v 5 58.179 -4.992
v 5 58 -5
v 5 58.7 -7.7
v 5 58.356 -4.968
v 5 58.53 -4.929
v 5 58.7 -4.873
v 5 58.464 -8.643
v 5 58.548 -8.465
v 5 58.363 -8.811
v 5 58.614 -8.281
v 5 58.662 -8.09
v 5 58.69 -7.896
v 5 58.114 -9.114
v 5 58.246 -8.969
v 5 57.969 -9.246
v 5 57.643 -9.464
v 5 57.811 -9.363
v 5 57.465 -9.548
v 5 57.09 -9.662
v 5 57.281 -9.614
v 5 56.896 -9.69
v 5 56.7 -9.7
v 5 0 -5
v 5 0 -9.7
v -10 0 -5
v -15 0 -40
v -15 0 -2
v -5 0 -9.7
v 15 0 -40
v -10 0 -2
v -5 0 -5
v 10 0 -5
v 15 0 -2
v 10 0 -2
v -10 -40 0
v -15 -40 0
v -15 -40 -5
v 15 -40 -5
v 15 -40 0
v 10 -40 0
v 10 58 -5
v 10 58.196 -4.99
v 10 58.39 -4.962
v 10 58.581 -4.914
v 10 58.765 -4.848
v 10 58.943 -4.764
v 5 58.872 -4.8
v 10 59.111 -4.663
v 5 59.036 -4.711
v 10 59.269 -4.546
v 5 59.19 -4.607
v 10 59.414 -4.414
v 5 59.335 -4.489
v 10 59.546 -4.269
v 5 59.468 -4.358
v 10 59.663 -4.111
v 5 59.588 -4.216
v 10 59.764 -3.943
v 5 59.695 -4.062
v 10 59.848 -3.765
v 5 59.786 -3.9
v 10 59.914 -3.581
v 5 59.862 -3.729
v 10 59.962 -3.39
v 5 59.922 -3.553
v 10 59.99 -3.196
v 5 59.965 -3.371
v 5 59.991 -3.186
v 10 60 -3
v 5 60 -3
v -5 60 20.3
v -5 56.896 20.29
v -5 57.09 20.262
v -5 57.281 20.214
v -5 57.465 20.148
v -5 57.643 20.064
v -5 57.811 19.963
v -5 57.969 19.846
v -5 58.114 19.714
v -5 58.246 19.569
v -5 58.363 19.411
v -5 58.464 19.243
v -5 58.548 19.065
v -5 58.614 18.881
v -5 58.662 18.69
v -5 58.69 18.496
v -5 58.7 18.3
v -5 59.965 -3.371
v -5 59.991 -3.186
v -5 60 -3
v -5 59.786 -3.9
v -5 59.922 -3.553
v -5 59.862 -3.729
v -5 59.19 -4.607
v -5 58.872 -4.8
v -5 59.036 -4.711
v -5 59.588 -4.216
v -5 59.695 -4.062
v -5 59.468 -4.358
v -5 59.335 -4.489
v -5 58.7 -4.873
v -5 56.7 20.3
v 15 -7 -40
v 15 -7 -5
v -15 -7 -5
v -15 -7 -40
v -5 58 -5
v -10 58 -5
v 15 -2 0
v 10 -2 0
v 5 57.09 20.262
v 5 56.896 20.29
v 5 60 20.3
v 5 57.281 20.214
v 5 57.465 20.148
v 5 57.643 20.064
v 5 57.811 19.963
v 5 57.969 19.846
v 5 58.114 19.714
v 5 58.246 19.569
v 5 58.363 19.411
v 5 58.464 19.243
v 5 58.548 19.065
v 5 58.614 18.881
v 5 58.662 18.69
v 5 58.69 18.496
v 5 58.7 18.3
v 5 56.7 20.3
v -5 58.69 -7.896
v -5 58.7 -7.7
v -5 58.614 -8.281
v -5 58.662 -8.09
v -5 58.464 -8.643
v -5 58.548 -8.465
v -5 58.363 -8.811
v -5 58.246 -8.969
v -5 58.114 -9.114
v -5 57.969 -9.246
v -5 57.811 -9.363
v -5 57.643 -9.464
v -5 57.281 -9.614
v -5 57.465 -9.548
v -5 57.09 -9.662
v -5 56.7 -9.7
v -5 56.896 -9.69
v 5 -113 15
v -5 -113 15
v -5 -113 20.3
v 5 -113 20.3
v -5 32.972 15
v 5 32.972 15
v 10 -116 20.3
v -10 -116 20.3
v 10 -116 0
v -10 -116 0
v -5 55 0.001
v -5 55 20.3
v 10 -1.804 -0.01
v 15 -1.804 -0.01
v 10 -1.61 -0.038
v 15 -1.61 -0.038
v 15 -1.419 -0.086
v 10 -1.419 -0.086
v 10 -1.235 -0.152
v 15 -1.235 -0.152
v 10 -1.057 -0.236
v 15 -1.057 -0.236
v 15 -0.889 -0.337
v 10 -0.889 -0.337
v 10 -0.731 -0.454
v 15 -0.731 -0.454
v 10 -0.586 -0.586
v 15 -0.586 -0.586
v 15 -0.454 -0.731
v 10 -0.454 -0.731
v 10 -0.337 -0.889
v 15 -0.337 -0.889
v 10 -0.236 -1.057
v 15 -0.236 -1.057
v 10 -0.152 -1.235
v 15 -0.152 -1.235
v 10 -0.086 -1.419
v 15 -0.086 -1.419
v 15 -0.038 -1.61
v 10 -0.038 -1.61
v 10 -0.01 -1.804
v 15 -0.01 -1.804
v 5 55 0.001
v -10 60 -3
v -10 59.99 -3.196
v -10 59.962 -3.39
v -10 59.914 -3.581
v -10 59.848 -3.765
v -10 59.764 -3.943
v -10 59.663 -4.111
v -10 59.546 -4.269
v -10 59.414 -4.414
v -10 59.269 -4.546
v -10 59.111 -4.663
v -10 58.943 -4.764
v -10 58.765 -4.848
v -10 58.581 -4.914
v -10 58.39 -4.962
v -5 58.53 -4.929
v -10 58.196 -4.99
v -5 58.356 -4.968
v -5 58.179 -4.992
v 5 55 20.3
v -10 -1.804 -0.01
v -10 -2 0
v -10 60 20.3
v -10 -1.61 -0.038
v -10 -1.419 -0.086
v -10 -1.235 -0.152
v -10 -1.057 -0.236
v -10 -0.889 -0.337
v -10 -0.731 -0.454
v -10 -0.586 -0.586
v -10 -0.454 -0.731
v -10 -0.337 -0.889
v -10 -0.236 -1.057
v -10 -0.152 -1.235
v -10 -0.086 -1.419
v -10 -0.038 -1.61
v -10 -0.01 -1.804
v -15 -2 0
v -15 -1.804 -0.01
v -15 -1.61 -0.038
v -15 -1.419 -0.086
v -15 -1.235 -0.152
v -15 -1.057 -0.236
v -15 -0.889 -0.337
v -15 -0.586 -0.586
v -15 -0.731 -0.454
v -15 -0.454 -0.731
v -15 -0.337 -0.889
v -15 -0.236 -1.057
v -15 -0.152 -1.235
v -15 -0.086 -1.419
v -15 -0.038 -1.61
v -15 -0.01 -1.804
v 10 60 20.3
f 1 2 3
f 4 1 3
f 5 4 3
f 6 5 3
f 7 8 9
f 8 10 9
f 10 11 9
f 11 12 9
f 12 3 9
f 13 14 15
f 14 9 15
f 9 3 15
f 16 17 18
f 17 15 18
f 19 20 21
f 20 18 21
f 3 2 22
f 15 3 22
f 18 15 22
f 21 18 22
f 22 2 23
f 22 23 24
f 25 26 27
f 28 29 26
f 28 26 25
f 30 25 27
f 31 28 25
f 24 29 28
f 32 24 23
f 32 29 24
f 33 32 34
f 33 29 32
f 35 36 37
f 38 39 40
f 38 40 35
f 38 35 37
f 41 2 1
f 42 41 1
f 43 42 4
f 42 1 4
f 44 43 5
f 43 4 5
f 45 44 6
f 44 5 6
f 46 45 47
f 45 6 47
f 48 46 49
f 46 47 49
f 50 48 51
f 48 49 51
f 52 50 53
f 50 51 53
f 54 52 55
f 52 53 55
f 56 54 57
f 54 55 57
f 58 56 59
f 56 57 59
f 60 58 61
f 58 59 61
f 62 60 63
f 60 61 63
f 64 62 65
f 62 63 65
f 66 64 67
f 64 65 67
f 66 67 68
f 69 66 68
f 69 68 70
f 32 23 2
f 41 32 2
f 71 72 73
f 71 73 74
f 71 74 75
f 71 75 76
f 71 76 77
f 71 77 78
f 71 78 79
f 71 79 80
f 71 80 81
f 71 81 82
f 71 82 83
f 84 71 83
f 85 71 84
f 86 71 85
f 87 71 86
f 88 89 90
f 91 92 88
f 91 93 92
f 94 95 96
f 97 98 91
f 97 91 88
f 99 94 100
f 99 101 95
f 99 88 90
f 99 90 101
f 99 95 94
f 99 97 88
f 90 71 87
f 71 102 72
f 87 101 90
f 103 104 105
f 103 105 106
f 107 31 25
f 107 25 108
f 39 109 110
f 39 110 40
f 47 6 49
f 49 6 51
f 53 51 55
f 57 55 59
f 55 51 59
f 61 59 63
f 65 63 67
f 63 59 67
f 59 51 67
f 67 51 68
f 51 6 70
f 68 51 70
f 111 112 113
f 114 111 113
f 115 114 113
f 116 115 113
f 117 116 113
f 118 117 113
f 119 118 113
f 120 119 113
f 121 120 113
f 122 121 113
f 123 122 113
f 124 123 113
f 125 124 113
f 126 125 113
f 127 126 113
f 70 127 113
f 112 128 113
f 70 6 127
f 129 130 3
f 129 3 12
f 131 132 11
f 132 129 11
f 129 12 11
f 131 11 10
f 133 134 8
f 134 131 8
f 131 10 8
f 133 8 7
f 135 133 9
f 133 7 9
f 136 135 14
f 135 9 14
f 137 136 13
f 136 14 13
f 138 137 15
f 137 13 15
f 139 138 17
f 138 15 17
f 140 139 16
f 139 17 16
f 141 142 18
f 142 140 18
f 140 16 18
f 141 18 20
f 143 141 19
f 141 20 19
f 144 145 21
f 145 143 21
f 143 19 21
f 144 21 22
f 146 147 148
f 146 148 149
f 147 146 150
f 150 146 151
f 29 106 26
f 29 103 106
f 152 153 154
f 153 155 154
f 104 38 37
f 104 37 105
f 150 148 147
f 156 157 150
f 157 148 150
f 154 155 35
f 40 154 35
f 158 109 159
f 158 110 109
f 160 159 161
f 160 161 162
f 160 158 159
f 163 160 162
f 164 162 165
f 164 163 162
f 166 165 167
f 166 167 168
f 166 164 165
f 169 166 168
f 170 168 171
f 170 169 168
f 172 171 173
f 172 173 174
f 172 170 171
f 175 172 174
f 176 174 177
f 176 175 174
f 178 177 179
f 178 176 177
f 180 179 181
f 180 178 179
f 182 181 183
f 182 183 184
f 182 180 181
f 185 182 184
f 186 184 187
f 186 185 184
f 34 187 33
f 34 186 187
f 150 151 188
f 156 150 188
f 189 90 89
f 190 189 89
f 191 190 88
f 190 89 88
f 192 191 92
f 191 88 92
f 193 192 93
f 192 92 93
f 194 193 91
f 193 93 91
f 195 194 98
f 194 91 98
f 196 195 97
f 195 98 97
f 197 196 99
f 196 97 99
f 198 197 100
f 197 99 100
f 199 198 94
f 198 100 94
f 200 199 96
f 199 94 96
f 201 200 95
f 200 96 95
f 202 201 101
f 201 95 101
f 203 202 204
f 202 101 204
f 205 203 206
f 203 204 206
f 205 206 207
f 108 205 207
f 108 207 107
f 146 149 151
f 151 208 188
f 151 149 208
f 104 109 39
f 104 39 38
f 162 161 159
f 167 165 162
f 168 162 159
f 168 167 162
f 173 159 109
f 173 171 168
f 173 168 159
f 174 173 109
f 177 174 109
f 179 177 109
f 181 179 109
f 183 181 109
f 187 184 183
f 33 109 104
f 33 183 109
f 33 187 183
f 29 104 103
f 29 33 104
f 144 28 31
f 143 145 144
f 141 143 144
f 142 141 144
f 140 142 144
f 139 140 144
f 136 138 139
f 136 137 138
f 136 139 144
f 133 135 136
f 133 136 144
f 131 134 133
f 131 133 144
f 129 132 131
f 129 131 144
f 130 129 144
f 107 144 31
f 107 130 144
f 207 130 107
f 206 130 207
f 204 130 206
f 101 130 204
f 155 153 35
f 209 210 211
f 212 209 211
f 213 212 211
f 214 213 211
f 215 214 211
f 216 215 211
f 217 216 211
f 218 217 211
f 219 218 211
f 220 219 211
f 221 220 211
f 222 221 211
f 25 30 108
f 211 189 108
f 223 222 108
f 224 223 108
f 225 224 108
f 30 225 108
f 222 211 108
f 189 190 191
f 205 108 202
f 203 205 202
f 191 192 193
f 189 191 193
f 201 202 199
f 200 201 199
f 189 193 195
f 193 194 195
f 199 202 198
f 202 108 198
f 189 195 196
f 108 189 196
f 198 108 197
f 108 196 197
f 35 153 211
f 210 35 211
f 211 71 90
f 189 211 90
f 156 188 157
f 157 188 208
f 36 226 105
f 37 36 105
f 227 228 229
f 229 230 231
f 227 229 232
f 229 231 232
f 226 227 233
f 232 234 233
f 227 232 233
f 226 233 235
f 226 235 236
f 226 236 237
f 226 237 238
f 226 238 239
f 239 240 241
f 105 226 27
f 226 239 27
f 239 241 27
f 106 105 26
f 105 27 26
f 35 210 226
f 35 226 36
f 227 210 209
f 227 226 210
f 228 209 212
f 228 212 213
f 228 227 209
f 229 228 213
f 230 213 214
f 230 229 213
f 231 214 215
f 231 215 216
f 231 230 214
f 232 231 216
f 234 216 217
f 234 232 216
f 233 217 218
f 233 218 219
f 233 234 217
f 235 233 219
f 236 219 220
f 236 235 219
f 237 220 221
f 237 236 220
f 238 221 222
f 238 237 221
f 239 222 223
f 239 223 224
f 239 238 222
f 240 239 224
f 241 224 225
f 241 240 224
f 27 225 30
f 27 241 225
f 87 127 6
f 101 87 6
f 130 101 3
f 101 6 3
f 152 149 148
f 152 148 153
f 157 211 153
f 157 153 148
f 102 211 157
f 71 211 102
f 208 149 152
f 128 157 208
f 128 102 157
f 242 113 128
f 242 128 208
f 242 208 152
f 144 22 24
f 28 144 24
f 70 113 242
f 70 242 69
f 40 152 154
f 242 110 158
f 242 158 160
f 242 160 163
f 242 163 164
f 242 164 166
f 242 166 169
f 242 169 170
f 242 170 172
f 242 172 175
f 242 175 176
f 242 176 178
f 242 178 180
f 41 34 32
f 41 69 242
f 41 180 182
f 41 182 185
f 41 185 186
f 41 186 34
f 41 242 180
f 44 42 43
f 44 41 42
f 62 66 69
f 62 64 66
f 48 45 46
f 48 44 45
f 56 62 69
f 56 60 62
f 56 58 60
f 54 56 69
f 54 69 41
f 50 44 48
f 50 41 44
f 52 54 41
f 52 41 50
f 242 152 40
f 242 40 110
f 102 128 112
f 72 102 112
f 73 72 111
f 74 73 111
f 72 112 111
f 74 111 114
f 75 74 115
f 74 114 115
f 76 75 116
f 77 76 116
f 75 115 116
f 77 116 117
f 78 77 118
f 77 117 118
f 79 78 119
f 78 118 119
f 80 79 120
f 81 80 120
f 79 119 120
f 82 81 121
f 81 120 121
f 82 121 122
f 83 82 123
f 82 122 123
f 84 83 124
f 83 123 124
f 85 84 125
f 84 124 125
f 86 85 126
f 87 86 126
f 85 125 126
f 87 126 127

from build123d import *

# Parameters (mm, degrees)
BOSS_EXTRUDE2_DEPTH = 15
BOSS_EXTRUDE3_DEPTH = 5
BOSS_EXTRUDE4_DEPTH = 5
BOSS_EXTRUDE5_DEPTH = 10
SKETCH10_W          = 10
SKETCH10_H          = 3
BOSS_EXTRUDE6_DEPTH = 5.3
FILLET1_R           = 2
FILLET2_R           = 2


with BuildPart() as part:
    # Sketch2 → Boss-Extrude2 (new, symmetric)
    with BuildSketch(Plane(origin=(0, 0, 0), x_dir=(0, 0, -1), z_dir=(1, 0, 0))):
        Polygon((0, 0), (0, -40), (5, -40), (5, -7), (40, -7), (40, 0), align=None)
    extrude(amount=BOSS_EXTRUDE2_DEPTH, both=True)

    # Sketch3 → Boss-Extrude3 (add, symmetric)
    with BuildSketch(Plane(origin=(0, 0, 0), x_dir=(0, 0, -1), z_dir=(1, 0, 0))):
        Polygon((0, -116), (-15, -116), (-15, 32.97157442), (0, 55.00157442), align=None)
    extrude(amount=BOSS_EXTRUDE3_DEPTH, both=True)

    # Sketch4 → Boss-Extrude4 (add)
    with BuildSketch(Plane.ZY.offset(5)):
        Polygon((0, 60), (20.3, 60), (20.3, -116), (0, -116), (0, 0), (-5, 0), (-5, 60), align=None)
    boss_extrude4 = extrude(amount=BOSS_EXTRUDE4_DEPTH)

    # Mirror1: Boss-Extrude4 across plane
    add(boss_extrude4.mirror(Plane(origin=(0, 0, 0), x_dir=(0, 0, 1), z_dir=(1, 0, 0))))

    # Sketch8 → Boss-Extrude5 (add)
    with BuildSketch(Plane.ZY.offset(-5)):
        Polygon((0, 0), (0, 55), (20.3, 55), (20.3, 58.7), (-9.7, 58.7), (-9.7, 0), align=None)
    extrude(amount=BOSS_EXTRUDE5_DEPTH)

    # Sketch10 → Boss-Extrude6 (add)
    with BuildSketch(Plane.XY.offset(15)):
        with Locations((0, -114.5)):
            Rectangle(SKETCH10_W, SKETCH10_H)
    extrude(amount=BOSS_EXTRUDE6_DEPTH)

    # Fillet1
    # the kernel refuses this fillet: 2 mm, written as the material it takes off along each edge
    with BuildSketch(Plane(origin=(5, 58.7, 20.3), x_dir=(0, -1, 0), z_dir=(-1, 0, 0))) as fillet1_piece_1:
        with BuildLine():
            CenterArc((FILLET1_R, -FILLET1_R), FILLET1_R, 90, 90)
            Line((0, -FILLET1_R), (0, 0))
            Line((0, 0), (FILLET1_R, 0))
        make_face()
    extrude(amount=10, mode=Mode.SUBTRACT)
    with BuildSketch(Plane(origin=(10, 58.7, -9.7), x_dir=(0, 0, 1), z_dir=(-1, 0, 0))) as fillet1_piece_2:
        with BuildLine():
            CenterArc((FILLET1_R, -FILLET1_R), FILLET1_R, 90, 90)
            Line((0, -FILLET1_R), (0, 0))
            Line((0, 0), (FILLET1_R, 0))
        make_face()
    extrude(amount=20, mode=Mode.SUBTRACT)
    with BuildSketch(Plane(origin=(-5, 60, -5), x_dir=(0, -1, 0), z_dir=(-1, 0, 0)), Plane(origin=(5, 60, -5), x_dir=(0, 0, 1), z_dir=(1, 0, 0))) as fillet1_piece_3:
        with BuildLine():
            CenterArc((FILLET1_R, FILLET1_R), FILLET1_R, 180, 90)
            Line((0, FILLET1_R), (0, 0))
            Line((0, 0), (FILLET1_R, 0))
        make_face()
    extrude(amount=10, mode=Mode.SUBTRACT)

    # Fillet2
    fillet2_edges = [part.edges().sort_by_distance(p)[0] for p in [
        (12.5, 0, 0),
        (-12.5, 0, 0),
    ]]
    fillet(fillet2_edges, radius=FILLET2_R)


solid = part.part
